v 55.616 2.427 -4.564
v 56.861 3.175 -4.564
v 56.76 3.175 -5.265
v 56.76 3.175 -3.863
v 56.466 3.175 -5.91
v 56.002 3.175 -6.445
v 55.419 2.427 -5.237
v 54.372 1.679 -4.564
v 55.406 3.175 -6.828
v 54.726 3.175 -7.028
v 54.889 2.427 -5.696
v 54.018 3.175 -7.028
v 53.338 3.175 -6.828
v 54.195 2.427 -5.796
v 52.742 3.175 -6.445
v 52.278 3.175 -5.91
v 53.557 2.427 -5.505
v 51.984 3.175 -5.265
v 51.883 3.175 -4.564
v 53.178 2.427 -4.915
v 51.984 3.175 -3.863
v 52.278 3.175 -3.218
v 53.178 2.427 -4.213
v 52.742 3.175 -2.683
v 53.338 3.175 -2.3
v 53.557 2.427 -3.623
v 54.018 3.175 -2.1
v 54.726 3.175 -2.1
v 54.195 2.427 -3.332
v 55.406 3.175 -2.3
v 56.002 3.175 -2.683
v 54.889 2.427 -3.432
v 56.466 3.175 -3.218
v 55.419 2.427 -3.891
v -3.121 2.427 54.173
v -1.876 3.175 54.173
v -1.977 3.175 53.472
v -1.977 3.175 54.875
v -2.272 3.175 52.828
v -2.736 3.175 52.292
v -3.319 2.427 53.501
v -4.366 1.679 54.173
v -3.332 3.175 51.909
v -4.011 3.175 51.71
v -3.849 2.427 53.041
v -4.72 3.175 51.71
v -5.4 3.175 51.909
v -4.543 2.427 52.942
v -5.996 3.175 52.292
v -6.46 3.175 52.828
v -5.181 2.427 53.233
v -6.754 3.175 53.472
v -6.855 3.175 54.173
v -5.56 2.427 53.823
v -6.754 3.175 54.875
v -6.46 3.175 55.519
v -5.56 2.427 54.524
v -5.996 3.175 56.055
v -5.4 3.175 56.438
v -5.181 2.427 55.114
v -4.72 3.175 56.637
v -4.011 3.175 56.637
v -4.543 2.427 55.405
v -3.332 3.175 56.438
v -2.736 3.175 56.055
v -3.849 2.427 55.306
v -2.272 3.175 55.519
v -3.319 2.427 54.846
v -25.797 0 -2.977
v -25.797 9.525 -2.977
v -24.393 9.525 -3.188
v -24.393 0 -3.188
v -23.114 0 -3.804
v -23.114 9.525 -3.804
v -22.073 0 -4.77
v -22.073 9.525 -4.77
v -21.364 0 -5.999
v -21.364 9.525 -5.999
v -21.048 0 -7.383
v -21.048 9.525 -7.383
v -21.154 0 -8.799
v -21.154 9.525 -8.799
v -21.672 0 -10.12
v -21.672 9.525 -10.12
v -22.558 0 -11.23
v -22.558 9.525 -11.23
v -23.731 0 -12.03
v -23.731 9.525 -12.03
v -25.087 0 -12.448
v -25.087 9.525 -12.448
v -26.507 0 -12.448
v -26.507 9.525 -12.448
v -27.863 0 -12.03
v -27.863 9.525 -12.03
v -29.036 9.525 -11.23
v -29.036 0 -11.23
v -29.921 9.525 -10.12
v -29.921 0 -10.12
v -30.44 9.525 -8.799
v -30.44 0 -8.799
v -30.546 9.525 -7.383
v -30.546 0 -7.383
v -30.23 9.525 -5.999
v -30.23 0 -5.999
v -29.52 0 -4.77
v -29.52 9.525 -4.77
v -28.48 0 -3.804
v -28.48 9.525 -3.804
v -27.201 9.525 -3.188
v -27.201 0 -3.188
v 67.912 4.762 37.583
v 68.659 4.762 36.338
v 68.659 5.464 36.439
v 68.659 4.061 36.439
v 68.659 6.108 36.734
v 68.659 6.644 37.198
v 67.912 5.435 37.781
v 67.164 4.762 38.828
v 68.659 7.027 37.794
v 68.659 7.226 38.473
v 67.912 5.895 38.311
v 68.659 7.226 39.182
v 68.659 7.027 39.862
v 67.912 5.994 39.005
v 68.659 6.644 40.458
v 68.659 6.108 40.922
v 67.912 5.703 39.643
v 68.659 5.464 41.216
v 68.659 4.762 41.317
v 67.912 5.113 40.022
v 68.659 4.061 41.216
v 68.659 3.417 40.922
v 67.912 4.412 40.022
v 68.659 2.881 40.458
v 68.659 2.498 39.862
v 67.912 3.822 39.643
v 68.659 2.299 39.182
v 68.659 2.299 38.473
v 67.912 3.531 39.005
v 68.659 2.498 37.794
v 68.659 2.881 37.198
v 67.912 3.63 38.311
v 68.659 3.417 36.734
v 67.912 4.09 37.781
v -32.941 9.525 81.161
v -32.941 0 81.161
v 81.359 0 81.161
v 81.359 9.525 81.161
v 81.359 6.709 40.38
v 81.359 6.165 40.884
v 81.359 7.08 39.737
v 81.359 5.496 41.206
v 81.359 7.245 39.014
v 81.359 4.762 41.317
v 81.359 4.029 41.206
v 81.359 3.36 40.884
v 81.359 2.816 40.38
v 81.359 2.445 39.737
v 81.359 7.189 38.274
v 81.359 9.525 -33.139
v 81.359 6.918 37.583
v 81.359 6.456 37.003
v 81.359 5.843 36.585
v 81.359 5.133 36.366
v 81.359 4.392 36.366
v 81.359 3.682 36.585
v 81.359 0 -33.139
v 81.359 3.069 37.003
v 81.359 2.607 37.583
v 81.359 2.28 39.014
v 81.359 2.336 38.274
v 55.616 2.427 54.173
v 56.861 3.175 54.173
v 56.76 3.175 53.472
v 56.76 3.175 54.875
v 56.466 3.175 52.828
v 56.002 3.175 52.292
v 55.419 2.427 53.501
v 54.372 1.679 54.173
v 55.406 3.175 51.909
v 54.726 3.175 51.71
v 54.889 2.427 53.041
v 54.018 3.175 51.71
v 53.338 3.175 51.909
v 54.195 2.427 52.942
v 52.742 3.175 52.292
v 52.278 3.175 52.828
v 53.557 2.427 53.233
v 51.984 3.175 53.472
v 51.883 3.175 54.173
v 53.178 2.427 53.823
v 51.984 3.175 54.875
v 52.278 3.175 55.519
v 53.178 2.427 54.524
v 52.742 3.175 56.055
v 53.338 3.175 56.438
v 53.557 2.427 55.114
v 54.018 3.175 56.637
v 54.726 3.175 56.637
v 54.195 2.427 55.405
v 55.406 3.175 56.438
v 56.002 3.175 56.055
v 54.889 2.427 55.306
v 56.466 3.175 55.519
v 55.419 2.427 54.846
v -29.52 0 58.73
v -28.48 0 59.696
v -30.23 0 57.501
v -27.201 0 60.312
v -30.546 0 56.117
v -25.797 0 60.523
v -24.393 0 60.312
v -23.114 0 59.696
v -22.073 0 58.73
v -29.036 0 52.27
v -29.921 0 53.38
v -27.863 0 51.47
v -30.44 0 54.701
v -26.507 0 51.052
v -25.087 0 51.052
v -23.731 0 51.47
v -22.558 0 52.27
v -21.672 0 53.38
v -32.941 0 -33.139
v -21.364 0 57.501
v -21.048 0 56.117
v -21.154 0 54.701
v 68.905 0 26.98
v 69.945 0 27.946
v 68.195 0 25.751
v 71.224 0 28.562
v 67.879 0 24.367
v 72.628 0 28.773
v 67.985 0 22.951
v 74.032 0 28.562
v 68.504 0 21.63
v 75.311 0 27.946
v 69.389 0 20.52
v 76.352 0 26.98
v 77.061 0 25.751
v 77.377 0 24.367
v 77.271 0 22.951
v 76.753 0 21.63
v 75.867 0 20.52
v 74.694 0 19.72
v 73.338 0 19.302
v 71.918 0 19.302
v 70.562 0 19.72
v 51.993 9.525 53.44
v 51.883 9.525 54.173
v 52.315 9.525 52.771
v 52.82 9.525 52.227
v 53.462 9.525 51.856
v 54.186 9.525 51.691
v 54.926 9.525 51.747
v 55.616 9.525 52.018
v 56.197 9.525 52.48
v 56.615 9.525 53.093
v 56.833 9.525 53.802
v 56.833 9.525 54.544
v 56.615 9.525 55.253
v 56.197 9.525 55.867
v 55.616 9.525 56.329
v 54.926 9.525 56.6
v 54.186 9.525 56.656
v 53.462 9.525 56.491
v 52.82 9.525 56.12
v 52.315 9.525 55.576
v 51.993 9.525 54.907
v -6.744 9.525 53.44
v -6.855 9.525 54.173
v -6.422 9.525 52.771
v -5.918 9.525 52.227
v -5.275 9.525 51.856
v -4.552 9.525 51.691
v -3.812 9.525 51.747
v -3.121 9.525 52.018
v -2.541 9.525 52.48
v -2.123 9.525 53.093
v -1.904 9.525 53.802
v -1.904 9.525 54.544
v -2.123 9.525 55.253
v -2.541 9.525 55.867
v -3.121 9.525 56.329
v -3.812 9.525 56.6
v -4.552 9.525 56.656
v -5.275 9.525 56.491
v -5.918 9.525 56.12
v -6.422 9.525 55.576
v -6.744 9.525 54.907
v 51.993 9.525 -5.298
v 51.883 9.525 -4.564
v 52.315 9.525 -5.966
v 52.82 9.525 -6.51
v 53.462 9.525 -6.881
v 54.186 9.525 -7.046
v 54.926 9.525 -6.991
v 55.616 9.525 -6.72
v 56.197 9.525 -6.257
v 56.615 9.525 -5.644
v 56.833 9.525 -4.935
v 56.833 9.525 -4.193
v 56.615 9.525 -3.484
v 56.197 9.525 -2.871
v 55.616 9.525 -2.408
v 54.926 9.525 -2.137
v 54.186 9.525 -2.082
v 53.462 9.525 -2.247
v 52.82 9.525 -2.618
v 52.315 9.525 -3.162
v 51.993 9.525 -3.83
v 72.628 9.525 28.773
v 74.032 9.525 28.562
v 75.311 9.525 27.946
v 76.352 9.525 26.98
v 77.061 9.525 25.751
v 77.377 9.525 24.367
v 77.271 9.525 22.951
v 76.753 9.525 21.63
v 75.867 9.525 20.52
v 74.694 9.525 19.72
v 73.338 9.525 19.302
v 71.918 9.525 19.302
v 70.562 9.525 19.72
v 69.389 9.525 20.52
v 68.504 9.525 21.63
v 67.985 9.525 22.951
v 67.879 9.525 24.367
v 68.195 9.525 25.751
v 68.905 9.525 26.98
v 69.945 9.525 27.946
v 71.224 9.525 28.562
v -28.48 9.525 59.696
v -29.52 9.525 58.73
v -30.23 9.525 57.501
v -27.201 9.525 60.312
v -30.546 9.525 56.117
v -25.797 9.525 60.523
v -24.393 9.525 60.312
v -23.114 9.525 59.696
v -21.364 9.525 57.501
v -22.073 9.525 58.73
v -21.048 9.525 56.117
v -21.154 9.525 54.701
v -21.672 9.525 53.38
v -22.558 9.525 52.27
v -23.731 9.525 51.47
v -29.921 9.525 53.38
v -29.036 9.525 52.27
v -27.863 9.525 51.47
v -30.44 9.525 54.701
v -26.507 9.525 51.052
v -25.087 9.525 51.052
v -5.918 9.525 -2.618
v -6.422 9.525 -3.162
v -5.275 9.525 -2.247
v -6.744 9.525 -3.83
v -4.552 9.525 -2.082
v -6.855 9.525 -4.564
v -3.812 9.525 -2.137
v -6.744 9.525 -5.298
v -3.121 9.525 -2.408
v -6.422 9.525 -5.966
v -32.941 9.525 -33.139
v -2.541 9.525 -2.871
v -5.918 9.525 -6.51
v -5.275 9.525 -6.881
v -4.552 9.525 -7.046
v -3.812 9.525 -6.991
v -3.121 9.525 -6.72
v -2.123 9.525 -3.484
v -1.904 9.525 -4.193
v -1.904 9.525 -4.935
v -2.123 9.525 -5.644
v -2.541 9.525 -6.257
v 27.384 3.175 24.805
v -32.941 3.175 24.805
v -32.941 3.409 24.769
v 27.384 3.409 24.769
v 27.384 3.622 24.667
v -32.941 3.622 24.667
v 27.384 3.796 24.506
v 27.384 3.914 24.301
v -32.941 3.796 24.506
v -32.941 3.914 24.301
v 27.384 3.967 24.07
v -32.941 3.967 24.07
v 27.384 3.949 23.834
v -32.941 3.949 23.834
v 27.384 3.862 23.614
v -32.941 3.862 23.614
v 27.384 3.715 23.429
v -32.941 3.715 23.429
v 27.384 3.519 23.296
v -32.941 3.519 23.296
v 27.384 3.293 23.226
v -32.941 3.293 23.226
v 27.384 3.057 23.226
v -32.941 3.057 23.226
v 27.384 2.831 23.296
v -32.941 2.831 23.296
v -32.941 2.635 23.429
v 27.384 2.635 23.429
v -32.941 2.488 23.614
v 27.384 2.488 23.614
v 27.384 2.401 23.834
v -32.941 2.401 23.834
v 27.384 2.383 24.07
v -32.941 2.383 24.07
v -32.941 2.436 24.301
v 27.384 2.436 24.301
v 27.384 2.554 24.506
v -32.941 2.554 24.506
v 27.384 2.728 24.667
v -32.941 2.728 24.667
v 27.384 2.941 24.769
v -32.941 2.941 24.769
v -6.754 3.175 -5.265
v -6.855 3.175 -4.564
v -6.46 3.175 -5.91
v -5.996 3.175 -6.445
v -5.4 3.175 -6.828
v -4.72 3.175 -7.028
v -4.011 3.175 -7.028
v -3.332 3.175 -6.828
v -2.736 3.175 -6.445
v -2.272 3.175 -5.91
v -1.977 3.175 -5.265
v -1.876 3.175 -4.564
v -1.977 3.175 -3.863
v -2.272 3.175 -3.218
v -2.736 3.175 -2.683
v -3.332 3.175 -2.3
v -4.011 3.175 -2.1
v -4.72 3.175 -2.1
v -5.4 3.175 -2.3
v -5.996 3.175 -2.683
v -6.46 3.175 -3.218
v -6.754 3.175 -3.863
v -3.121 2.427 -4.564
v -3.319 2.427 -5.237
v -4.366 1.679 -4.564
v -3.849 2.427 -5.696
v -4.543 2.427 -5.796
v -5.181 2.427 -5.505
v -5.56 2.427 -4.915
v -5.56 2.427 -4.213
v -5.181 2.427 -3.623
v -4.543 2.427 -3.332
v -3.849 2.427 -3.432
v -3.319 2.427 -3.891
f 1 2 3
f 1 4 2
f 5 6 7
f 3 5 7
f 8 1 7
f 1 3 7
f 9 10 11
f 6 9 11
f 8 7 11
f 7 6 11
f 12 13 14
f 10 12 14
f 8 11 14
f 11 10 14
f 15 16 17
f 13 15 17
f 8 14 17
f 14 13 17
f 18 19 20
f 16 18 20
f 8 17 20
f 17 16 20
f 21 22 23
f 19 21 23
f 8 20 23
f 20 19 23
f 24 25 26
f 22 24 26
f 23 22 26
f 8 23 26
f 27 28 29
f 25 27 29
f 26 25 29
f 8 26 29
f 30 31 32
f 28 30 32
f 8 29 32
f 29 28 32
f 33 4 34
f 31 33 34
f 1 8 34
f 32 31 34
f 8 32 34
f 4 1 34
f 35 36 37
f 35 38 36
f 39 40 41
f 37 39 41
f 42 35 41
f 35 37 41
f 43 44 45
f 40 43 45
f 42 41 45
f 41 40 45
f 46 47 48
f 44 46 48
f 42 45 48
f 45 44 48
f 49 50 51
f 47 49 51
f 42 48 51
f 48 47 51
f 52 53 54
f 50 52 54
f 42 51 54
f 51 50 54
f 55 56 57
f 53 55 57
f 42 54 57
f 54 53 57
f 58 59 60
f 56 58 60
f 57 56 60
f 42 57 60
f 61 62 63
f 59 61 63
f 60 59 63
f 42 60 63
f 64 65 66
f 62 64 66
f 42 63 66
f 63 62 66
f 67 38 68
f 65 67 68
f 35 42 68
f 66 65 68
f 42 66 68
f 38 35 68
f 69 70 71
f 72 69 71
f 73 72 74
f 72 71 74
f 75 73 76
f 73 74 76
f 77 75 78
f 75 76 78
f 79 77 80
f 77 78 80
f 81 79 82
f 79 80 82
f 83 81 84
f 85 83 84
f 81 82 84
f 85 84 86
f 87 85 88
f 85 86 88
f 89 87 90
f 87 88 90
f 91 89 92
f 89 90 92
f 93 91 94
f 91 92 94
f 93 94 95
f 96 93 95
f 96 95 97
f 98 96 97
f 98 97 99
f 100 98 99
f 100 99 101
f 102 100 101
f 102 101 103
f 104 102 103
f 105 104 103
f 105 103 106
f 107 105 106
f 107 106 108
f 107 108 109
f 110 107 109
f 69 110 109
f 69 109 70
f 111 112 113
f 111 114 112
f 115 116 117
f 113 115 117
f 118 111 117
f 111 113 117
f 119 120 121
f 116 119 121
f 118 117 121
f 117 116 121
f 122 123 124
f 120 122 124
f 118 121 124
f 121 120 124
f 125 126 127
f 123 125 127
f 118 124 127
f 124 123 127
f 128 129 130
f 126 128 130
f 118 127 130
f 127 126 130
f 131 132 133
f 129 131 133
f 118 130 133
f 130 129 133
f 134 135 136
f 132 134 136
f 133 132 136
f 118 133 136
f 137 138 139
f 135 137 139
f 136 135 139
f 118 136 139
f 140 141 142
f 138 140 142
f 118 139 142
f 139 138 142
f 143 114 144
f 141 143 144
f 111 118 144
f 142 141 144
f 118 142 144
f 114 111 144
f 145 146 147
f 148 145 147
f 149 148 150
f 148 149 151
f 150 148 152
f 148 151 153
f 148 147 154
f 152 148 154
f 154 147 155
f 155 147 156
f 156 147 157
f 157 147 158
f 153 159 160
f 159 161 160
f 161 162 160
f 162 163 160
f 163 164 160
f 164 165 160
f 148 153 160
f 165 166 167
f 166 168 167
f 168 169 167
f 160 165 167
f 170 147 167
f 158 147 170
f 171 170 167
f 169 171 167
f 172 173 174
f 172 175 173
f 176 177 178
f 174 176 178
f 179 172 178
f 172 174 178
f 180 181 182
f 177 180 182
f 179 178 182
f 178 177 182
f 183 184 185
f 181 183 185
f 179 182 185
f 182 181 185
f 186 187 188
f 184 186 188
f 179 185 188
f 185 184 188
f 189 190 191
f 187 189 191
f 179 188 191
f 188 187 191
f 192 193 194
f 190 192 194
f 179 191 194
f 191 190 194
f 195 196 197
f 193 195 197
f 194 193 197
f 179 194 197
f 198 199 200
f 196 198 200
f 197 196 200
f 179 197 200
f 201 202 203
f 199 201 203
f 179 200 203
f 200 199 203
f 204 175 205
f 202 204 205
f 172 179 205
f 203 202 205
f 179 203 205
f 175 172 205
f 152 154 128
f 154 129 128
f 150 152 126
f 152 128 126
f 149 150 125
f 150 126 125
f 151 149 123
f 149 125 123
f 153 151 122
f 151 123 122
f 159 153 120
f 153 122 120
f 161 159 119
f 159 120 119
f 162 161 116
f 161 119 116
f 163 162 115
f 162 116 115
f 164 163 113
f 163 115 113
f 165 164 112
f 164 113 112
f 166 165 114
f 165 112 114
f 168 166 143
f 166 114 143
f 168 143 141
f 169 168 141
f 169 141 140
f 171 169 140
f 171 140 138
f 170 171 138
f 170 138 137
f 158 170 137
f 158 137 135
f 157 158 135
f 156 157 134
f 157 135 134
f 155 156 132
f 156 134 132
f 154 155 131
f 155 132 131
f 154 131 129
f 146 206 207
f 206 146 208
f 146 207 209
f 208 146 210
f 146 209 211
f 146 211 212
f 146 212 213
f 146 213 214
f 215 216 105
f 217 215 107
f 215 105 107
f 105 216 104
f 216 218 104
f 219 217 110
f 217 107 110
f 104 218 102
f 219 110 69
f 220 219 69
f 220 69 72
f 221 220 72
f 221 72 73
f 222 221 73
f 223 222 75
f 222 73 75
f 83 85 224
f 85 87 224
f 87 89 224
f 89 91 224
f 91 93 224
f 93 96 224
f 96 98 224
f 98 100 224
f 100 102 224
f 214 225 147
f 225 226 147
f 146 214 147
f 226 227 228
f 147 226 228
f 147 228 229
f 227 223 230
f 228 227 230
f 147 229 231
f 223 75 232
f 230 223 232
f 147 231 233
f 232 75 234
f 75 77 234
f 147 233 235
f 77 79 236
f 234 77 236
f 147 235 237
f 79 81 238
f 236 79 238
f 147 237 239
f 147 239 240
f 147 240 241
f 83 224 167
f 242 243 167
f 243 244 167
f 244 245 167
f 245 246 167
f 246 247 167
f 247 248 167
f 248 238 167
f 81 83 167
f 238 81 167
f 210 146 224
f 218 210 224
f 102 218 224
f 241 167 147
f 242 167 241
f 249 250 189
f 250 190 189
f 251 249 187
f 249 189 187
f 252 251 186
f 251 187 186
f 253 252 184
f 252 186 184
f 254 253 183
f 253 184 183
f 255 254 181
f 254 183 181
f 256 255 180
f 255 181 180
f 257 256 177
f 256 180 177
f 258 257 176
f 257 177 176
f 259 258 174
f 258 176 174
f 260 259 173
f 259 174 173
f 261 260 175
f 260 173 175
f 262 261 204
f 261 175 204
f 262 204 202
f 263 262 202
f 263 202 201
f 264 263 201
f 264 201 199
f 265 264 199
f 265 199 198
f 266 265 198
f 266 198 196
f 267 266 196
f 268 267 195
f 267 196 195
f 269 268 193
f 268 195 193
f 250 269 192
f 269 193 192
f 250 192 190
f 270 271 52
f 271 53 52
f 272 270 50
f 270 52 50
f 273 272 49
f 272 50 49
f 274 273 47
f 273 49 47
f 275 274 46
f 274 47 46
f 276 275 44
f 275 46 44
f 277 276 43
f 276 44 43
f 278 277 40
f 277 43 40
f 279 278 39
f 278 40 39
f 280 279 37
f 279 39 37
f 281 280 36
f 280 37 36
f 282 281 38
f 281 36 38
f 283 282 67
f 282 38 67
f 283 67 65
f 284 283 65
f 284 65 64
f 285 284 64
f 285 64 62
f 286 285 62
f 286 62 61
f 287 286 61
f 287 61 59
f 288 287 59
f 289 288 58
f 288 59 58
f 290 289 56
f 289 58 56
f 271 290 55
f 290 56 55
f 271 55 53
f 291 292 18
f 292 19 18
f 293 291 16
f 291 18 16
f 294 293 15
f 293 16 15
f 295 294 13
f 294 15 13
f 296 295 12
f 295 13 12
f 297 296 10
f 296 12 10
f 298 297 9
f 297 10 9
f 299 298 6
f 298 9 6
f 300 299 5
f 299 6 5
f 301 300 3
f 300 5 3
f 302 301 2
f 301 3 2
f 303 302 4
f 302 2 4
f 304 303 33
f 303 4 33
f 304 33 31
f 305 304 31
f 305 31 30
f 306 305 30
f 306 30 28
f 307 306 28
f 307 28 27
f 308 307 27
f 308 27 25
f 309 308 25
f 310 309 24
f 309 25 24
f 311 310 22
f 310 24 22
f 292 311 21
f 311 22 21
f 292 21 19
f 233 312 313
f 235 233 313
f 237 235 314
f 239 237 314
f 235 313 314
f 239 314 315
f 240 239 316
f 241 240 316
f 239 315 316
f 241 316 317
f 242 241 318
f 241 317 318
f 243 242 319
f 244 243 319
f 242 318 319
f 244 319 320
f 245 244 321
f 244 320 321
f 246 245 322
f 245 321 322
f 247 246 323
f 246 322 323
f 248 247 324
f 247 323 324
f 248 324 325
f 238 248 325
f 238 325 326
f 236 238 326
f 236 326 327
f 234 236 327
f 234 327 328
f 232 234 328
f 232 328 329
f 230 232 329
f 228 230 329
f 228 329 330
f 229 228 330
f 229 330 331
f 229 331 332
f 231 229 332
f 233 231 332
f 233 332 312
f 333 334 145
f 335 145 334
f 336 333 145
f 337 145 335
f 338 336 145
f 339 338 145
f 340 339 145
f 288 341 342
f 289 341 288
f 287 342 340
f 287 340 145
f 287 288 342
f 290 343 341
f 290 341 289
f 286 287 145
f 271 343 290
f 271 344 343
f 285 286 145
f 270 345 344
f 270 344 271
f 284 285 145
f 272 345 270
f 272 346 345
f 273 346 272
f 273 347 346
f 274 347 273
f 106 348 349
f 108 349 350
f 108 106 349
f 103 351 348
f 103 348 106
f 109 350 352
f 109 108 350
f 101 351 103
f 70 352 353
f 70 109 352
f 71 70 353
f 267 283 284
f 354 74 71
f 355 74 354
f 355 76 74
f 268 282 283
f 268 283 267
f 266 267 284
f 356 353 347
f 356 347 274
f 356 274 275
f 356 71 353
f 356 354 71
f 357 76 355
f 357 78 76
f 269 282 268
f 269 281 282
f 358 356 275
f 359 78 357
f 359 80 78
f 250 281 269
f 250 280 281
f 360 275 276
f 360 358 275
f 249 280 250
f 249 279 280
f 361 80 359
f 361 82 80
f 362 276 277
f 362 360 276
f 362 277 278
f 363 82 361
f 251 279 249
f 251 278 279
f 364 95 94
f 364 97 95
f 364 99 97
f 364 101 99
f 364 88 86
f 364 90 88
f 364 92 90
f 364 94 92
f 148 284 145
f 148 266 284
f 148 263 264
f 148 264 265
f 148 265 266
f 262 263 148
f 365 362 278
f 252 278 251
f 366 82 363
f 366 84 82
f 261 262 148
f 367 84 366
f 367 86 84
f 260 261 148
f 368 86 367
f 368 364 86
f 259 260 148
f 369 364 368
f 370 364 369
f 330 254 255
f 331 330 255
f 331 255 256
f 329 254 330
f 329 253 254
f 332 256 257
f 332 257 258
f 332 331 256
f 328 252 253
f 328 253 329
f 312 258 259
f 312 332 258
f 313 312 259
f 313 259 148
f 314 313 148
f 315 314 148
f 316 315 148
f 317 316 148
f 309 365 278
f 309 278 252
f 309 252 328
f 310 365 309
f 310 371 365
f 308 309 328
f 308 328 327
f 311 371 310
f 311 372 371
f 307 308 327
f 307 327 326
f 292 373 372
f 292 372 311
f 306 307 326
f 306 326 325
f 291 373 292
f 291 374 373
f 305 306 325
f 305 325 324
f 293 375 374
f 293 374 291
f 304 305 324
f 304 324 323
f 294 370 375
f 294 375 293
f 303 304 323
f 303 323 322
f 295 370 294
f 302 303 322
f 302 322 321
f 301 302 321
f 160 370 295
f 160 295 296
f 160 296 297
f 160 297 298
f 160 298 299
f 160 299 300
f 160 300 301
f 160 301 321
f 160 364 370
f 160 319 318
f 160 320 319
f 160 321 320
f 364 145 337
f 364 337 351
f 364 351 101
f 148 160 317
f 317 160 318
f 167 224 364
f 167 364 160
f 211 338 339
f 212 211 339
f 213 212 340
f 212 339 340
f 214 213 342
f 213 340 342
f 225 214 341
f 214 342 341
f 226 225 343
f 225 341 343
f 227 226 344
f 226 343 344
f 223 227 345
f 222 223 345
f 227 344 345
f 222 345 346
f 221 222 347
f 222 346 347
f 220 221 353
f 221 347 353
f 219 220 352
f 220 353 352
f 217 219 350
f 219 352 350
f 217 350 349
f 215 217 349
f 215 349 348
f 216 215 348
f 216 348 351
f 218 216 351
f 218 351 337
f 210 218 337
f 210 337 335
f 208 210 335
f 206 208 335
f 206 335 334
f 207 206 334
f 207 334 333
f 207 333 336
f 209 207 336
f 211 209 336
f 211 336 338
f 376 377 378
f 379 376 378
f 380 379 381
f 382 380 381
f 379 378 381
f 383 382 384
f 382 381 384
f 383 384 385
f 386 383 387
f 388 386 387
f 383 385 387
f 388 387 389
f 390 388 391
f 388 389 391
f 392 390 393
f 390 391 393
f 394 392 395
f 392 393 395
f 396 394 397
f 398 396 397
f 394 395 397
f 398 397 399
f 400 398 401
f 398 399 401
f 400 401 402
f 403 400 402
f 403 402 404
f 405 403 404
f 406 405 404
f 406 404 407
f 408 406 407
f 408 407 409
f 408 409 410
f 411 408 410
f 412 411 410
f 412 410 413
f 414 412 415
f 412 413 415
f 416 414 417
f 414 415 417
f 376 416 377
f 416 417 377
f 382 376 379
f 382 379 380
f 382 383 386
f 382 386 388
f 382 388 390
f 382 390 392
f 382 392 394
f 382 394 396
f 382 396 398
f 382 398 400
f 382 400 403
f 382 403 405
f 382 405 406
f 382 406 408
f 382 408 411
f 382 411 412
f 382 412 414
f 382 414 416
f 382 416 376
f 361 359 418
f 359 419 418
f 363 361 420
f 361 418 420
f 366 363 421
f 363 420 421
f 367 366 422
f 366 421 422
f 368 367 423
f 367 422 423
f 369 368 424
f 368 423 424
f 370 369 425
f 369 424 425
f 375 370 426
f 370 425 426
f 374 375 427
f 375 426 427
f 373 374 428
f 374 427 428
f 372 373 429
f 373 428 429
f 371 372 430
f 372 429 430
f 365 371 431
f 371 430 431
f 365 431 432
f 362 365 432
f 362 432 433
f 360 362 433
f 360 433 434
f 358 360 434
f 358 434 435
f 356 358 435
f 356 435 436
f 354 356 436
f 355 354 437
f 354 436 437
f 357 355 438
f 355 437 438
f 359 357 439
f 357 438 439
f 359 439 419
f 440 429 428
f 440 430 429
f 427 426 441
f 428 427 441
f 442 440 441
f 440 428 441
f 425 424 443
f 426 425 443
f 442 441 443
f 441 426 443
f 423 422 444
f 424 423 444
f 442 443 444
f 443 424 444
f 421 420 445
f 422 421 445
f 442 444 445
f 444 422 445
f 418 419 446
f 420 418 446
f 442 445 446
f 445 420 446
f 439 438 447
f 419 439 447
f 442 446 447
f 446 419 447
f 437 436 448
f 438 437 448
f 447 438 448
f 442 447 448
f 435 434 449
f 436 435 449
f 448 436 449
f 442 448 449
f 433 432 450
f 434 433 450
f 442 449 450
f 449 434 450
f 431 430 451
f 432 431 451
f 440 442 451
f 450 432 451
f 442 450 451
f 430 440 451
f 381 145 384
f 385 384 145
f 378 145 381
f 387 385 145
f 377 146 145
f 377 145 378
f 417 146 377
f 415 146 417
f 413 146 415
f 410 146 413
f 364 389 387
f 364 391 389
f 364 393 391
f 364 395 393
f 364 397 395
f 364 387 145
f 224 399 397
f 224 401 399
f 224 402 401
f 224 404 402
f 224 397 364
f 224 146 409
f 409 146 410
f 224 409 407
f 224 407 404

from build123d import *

# Parameters (mm, degrees)
SKETCH1_W                      = 114.3
SKETCH1_H                      = 114.3
SEEBECK_MIDDLE_BLOCK_DEPTH     = 9.525
SKETCH2_R                      = 0.79375
THERMO_COUPLE_HOLE_DEPTH       = 60.325
SKETCH3_R                      = 4.7625
MIDDLE_MOUNTING_HOLES_DEPTH    = 116.31336133
F_9_0_196_TEG_MOUNT_HOLE_D     = 4.9784
F_9_0_196_TEG_MOUNT_HOLE_DEPTH = 6.35
F_9_0_196_TEG_MOUNT_HOLE_TIP   = 1.495662253
F_9_0_196_VOLTAGE_HOLE_D       = 4.9784
F_9_0_196_VOLTAGE_HOLE_DEPTH   = 12.7
F_9_0_196_VOLTAGE_HOLE_TIP     = 1.495662253


with BuildPart() as part:
    # Sketch1 → Seebeck Middle Block (new body)
    with BuildSketch(Plane(origin=(0, 0, 0), x_dir=(1, 0, 0), z_dir=(0, 1, 0))):
        with Locations((24.209375, -24.0109375)):
            Rectangle(SKETCH1_W, SKETCH1_H)
    extrude(amount=SEEBECK_MIDDLE_BLOCK_DEPTH)

    # Sketch2 → Thermo Couple Hole (cut)
    with BuildSketch(Plane.ZY.offset(32.940625)):
        with Locations((24.0109375, 3.175)):
            Circle(SKETCH2_R)
    extrude(amount=-THERMO_COUPLE_HOLE_DEPTH, mode=Mode.SUBTRACT)

    # Sketch3 → Middle Mounting holes (cut, through all)
    with BuildSketch(Plane(origin=(0, 9.525, 0), x_dir=(1, 0, 0), z_dir=(0, 1, 0))):
        with Locations(Location((-25.796875, -55.7609375, 0), (0, 0, 270))):
            Circle(SKETCH3_R)
        with Locations(Location((-25.796875, 7.7390625, 0), (0, 0, 270))):
            Circle(SKETCH3_R)
        with Locations(Location((72.628125, -24.0109375, 0), (0, 0, 270))):
            Circle(SKETCH3_R)
    extrude(amount=-MIDDLE_MOUNTING_HOLES_DEPTH, mode=Mode.SUBTRACT)

    # #9 (0.196) TEG Mount Hole
    with Locations(Plane(origin=(0, 9.525, 0), x_dir=(1, 0, 0), z_dir=(0, 1, 0))):
        with Locations((-4.365625, 4.5640625), (54.371875, 4.5640625), (54.371875, -54.1734375), (-4.365625, -54.1734375)):
            Hole(F_9_0_196_TEG_MOUNT_HOLE_D / 2, depth=F_9_0_196_TEG_MOUNT_HOLE_DEPTH)
            with Locations((0, 0, -(F_9_0_196_TEG_MOUNT_HOLE_DEPTH + F_9_0_196_TEG_MOUNT_HOLE_TIP / 2))):  # 118° drill point
                Cone(0, F_9_0_196_TEG_MOUNT_HOLE_D / 2, F_9_0_196_TEG_MOUNT_HOLE_TIP, mode=Mode.SUBTRACT)

    # #9 (0.196) Voltage Hole
    with Locations(Plane(origin=(81.359375, 0, 0), x_dir=(0, 0, -1), z_dir=(1, 0, 0))):
        with Locations((-38.827604082, 4.7625)):
            Hole(F_9_0_196_VOLTAGE_HOLE_D / 2, depth=F_9_0_196_VOLTAGE_HOLE_DEPTH)
            with Locations((0, 0, -(F_9_0_196_VOLTAGE_HOLE_DEPTH + F_9_0_196_VOLTAGE_HOLE_TIP / 2))):  # 118° drill point
                Cone(0, F_9_0_196_VOLTAGE_HOLE_D / 2, F_9_0_196_VOLTAGE_HOLE_TIP, mode=Mode.SUBTRACT)


solid = part.part
